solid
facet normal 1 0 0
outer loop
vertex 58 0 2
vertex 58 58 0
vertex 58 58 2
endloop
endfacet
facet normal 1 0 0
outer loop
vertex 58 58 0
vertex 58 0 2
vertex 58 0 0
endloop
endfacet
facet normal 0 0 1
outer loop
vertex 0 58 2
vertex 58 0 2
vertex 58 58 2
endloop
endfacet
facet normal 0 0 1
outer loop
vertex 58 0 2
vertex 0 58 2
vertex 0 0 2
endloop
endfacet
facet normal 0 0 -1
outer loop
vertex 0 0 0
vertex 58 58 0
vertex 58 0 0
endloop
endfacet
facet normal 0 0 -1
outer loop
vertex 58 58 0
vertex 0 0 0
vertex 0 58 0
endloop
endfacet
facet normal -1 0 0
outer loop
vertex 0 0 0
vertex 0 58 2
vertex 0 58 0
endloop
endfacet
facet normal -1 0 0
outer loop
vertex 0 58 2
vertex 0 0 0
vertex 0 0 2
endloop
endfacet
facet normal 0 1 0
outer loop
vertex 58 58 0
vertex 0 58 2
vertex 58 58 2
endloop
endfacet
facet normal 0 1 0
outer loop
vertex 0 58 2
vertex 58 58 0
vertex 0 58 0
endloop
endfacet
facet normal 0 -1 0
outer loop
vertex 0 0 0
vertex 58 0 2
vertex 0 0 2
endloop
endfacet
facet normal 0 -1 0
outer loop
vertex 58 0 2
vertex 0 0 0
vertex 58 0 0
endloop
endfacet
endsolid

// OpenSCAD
logo="Slub-0342.png"; 

wid=58; 
logox = 537; 
logoy = 432; 

difference(){ 
    cube([wid,wid,2]); 
    translate([wid/4,wid/4,3]) 
        scale([.5*wid/logox,.5*wid/logoy,.02]) 
            surface(file=logo,invert=true); 

} 
